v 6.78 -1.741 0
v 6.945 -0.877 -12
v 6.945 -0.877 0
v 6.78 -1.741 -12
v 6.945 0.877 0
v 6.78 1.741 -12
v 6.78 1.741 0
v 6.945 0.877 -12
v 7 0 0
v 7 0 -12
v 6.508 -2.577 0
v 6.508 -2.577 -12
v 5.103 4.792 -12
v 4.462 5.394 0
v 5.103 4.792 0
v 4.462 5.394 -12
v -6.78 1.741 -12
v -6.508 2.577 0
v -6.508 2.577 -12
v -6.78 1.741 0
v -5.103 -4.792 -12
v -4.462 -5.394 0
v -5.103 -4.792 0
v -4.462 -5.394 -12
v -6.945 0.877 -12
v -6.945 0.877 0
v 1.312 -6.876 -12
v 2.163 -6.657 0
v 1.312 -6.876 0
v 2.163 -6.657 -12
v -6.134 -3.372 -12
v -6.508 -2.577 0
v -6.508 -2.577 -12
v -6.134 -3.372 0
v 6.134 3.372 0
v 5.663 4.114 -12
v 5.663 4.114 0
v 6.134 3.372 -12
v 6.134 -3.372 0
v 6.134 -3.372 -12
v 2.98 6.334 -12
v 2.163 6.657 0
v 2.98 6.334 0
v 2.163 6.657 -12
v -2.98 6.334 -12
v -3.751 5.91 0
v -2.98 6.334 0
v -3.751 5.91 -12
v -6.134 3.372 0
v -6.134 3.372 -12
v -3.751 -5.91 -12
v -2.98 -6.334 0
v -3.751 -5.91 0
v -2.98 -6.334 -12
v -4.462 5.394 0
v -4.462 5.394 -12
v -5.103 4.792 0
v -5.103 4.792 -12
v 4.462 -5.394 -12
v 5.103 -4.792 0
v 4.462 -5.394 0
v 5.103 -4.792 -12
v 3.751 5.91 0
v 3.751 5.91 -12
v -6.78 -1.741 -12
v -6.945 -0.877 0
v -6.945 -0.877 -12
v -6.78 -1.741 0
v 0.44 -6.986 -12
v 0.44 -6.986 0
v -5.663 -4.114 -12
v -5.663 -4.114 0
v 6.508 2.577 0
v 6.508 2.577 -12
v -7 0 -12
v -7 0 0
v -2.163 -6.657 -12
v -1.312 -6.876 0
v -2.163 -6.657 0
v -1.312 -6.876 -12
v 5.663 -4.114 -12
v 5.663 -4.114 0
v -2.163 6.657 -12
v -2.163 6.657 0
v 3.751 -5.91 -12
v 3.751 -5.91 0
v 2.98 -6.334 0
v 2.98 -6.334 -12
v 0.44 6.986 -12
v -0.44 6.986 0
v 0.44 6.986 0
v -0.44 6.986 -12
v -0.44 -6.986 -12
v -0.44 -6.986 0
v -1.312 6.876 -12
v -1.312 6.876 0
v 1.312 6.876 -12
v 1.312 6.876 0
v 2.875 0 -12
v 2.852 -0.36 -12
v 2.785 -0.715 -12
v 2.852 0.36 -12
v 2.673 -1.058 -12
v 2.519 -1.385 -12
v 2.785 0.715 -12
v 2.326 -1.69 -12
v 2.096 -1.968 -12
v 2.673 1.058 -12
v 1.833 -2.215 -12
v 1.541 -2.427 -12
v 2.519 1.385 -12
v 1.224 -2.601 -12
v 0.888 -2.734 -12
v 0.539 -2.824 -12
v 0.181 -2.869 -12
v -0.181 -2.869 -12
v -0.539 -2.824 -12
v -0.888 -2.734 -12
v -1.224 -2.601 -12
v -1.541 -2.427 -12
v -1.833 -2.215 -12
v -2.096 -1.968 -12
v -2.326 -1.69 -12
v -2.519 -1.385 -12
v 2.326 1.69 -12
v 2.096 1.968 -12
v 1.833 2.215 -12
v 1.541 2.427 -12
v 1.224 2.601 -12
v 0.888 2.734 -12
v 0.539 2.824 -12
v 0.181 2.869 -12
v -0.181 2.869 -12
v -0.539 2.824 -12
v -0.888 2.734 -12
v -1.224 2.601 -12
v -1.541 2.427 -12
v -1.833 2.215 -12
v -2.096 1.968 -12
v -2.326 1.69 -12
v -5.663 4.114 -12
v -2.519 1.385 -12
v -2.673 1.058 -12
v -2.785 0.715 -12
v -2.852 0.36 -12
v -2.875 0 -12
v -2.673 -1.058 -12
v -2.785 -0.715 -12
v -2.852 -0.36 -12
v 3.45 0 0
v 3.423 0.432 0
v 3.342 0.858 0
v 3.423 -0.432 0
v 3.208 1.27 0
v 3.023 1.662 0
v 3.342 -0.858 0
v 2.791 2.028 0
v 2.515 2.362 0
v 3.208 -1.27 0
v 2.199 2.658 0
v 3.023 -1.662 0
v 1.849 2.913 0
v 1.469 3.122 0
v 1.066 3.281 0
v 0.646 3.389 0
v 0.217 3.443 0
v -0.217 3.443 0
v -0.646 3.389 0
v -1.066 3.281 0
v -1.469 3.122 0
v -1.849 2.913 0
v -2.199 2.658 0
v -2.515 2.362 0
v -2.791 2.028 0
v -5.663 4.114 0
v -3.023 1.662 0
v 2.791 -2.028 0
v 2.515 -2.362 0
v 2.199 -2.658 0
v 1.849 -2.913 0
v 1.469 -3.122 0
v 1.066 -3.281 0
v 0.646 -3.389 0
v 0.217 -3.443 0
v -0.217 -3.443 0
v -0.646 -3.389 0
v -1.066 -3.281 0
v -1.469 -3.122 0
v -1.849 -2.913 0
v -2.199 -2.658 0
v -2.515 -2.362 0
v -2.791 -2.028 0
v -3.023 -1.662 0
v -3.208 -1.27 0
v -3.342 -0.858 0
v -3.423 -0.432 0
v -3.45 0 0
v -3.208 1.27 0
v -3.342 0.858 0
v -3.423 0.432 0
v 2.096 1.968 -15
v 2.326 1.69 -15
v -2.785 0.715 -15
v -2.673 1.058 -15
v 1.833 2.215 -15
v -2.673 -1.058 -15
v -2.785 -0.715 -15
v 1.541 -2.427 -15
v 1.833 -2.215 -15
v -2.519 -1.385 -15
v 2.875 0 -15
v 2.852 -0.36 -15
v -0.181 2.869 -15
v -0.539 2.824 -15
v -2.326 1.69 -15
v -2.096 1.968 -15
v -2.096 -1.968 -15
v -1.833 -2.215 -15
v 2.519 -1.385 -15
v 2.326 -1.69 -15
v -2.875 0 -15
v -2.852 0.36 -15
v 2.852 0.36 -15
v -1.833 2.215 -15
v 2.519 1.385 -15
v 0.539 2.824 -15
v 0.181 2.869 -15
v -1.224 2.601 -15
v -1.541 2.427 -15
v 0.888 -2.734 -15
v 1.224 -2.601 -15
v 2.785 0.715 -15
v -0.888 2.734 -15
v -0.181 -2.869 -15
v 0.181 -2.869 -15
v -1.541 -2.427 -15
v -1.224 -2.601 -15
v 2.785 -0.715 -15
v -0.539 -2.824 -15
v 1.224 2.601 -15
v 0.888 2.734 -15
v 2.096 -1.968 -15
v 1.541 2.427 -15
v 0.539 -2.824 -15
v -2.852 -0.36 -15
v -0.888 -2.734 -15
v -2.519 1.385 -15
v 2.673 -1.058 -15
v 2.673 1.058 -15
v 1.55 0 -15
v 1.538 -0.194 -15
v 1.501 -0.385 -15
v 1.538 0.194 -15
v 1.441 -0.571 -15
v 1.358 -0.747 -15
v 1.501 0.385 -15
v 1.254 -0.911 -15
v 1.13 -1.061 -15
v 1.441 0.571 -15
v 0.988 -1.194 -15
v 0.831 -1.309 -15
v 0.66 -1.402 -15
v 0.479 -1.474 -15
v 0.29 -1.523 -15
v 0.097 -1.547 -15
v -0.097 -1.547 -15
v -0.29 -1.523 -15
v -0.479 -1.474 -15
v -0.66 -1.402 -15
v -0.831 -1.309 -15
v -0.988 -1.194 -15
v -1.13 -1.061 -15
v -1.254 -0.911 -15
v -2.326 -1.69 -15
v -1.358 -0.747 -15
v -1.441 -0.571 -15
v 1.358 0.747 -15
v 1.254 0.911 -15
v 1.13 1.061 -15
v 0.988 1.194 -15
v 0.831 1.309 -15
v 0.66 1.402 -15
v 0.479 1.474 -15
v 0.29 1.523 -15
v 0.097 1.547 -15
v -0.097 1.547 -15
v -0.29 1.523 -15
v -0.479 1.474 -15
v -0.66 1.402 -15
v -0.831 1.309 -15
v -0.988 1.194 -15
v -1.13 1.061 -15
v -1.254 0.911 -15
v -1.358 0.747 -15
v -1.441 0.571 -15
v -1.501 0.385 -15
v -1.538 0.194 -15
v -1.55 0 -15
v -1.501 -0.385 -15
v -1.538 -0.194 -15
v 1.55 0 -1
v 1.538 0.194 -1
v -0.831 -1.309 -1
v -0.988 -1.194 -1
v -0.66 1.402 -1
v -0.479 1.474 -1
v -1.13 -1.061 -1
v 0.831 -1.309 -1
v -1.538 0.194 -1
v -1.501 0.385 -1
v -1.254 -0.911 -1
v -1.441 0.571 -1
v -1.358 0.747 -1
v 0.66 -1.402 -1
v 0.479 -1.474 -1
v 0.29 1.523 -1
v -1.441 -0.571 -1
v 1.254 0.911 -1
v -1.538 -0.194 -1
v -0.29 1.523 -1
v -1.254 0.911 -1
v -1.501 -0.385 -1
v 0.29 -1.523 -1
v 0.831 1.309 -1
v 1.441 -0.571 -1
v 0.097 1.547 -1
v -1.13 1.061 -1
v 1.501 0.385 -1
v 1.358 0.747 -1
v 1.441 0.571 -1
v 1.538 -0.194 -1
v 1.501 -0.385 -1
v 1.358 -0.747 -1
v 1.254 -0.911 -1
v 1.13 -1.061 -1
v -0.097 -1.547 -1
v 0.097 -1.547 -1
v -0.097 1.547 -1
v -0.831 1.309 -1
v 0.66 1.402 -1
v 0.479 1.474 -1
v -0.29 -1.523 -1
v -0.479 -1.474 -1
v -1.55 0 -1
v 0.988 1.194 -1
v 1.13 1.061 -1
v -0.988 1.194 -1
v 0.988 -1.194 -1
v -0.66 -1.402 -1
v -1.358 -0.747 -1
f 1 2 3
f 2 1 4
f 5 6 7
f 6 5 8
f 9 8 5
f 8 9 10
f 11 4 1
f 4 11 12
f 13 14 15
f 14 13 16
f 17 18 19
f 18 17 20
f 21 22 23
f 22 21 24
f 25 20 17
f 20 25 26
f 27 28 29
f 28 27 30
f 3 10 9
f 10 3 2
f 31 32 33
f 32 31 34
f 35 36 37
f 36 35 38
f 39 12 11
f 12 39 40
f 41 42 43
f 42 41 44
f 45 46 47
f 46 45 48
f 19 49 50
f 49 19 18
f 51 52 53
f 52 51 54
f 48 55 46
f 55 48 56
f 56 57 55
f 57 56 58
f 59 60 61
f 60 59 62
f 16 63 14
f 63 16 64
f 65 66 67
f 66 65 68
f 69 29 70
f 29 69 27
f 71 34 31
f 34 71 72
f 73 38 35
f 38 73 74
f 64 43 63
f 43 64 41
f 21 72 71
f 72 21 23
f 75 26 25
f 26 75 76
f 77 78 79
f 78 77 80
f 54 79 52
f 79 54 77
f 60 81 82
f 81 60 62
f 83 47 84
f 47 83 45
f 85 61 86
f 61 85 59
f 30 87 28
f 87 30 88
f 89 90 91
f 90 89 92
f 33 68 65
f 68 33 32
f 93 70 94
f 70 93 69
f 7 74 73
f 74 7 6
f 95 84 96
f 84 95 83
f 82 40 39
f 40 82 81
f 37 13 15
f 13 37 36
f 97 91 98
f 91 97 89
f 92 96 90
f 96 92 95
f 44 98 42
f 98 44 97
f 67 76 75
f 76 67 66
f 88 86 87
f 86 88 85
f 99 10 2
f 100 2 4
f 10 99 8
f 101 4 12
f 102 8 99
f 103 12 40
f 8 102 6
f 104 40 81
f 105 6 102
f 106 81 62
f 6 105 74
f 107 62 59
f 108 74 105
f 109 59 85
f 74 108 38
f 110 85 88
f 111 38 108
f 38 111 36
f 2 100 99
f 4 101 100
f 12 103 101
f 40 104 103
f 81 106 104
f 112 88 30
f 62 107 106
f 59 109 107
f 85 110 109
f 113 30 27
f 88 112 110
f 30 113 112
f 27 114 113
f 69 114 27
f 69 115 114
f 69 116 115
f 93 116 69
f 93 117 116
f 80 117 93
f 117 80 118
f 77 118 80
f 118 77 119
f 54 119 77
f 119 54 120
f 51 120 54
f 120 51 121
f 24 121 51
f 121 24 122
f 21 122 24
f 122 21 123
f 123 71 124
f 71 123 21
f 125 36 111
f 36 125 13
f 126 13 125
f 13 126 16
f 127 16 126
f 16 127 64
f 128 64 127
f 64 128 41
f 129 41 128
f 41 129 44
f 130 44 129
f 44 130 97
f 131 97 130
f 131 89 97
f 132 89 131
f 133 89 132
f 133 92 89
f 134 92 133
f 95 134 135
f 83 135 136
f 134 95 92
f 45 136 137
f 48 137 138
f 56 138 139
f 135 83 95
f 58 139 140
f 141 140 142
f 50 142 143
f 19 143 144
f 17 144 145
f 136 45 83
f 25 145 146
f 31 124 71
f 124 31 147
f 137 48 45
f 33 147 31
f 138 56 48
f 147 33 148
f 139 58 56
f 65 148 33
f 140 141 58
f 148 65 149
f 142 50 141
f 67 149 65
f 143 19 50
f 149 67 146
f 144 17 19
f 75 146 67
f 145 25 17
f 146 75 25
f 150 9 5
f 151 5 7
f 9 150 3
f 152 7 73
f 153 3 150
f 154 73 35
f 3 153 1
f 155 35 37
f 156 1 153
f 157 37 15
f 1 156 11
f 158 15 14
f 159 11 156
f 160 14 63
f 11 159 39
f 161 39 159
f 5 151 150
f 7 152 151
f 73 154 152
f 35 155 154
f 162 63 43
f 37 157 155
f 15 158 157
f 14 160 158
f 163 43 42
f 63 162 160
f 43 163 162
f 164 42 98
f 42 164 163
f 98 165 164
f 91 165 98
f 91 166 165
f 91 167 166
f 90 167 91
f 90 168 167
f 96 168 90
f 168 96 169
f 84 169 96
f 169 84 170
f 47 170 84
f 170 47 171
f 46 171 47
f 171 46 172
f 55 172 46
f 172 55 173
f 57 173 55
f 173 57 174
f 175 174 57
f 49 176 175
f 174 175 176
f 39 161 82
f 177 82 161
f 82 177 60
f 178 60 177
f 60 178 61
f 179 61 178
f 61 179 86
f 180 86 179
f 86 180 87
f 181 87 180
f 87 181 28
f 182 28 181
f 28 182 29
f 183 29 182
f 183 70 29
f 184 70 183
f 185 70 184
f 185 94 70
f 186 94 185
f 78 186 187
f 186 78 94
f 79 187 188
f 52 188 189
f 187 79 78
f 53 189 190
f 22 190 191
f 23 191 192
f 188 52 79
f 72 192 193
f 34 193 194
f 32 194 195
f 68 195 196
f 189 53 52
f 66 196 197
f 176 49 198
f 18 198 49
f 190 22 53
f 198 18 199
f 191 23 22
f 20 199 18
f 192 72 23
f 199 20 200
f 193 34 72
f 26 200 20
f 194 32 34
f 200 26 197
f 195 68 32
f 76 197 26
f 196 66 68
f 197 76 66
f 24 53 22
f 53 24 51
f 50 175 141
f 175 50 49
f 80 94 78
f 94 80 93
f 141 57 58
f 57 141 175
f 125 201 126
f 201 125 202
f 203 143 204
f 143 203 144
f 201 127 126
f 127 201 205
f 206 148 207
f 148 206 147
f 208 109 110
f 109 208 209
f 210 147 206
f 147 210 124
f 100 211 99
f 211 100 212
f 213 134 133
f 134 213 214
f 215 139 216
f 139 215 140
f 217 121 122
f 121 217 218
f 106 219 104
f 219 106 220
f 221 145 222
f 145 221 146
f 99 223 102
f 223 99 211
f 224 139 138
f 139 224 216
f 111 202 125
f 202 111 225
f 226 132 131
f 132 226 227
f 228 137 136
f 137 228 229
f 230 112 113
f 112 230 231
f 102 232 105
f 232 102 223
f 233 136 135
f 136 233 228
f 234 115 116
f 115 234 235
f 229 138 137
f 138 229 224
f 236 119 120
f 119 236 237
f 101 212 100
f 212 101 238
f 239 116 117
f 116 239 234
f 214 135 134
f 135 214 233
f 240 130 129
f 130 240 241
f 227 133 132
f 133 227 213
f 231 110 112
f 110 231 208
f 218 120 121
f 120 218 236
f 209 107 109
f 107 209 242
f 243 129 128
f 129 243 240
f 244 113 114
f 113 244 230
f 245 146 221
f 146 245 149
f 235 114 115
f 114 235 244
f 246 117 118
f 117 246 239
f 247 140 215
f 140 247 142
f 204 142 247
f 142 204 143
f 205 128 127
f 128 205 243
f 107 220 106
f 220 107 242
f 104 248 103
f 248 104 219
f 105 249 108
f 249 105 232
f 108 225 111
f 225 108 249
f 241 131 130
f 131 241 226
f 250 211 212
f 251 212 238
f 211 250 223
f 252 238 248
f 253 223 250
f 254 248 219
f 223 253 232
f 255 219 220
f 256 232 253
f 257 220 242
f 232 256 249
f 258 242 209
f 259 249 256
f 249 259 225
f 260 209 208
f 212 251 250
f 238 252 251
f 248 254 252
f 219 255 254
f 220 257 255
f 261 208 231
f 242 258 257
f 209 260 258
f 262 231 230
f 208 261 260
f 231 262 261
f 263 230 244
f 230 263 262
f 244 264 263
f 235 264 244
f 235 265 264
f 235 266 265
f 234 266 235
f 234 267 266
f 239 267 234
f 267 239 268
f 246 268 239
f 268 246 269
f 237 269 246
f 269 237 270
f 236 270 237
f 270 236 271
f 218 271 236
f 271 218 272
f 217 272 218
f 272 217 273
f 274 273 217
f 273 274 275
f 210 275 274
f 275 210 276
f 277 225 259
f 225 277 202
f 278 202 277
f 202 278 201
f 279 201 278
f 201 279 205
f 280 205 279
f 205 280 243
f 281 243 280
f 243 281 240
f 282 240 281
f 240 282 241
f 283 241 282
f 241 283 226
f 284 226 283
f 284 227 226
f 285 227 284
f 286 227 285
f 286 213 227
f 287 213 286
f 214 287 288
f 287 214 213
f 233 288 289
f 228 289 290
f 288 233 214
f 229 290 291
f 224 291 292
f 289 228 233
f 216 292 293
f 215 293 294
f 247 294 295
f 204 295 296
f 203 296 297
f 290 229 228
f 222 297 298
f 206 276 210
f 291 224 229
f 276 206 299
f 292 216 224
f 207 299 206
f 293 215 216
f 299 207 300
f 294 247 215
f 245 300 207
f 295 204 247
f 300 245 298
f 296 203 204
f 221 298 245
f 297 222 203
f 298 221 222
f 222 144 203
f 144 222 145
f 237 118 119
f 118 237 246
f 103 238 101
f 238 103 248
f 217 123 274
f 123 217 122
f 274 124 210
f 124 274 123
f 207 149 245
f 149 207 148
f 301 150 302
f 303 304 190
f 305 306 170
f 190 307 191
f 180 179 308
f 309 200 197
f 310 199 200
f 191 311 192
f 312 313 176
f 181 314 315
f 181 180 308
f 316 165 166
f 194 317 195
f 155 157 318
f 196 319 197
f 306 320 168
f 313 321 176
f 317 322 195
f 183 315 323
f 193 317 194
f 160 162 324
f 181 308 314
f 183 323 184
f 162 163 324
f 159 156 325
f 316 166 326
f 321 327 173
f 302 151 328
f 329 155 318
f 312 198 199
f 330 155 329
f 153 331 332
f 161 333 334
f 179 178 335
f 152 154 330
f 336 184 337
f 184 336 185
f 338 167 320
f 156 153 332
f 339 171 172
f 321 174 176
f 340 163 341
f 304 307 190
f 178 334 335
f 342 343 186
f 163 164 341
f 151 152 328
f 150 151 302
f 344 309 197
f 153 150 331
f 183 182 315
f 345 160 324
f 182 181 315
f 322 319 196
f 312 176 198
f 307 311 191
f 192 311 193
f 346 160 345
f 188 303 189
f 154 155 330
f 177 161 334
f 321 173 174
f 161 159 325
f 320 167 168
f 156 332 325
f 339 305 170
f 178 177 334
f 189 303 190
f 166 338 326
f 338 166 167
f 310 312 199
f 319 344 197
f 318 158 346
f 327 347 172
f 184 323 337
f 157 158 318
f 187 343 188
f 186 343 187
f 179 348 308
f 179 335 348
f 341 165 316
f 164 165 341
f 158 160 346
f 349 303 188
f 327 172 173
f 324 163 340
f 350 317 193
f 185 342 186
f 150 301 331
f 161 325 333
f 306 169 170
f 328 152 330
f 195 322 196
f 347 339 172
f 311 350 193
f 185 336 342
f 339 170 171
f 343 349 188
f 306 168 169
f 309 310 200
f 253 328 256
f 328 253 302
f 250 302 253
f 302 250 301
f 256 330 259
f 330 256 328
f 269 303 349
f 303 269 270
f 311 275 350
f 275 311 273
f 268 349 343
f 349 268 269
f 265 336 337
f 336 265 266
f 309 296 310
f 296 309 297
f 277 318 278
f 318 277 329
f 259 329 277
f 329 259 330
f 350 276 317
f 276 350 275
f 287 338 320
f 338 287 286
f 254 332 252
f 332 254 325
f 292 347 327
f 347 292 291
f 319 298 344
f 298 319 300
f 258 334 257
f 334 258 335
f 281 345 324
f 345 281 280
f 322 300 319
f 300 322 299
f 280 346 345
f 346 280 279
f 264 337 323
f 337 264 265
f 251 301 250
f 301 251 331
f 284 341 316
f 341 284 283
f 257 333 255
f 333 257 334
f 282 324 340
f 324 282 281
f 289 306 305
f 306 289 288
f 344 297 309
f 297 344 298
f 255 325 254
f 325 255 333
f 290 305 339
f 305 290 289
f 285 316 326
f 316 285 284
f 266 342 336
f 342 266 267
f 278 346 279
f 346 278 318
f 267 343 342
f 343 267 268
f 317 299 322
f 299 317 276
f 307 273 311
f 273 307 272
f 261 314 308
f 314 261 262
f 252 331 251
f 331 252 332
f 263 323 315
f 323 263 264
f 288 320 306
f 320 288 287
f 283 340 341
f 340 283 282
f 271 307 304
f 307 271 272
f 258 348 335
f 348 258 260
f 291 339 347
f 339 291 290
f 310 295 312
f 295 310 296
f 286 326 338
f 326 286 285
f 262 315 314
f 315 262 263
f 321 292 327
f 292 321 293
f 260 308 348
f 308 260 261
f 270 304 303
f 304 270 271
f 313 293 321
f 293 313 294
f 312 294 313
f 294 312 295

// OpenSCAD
$fn = 50;


difference() {
	union() {
		translate(v = [0, 0, -12.0000000000]) {
			cylinder(h = 12, r = 7.0000000000);
		}
		translate(v = [0, 0, -15.0000000000]) {
			cylinder(h = 15, r = 2.8750000000);
		}
	}
	union() {
		translate(v = [0, 0, 0]) {
			rotate(a = [0, 0, 0]) {
				difference() {
					union() {
						translate(v = [0, 0, -15.0000000000]) {
							cylinder(h = 15, r = 1.2500000000);
						}
						translate(v = [0, 0, -1.0000000000]) {
							cylinder(h = 1.0000000000, r1 = 1.5500000000, r2 = 3.4500000000);
						}
						translate(v = [0, 0, -15.0000000000]) {
							cylinder(h = 15, r = 1.5500000000);
						}
						translate(v = [0, 0, -15.0000000000]) {
							cylinder(h = 15, r = 1.2500000000);
						}
					}
					union();
				}
			}
		}
	}
}
